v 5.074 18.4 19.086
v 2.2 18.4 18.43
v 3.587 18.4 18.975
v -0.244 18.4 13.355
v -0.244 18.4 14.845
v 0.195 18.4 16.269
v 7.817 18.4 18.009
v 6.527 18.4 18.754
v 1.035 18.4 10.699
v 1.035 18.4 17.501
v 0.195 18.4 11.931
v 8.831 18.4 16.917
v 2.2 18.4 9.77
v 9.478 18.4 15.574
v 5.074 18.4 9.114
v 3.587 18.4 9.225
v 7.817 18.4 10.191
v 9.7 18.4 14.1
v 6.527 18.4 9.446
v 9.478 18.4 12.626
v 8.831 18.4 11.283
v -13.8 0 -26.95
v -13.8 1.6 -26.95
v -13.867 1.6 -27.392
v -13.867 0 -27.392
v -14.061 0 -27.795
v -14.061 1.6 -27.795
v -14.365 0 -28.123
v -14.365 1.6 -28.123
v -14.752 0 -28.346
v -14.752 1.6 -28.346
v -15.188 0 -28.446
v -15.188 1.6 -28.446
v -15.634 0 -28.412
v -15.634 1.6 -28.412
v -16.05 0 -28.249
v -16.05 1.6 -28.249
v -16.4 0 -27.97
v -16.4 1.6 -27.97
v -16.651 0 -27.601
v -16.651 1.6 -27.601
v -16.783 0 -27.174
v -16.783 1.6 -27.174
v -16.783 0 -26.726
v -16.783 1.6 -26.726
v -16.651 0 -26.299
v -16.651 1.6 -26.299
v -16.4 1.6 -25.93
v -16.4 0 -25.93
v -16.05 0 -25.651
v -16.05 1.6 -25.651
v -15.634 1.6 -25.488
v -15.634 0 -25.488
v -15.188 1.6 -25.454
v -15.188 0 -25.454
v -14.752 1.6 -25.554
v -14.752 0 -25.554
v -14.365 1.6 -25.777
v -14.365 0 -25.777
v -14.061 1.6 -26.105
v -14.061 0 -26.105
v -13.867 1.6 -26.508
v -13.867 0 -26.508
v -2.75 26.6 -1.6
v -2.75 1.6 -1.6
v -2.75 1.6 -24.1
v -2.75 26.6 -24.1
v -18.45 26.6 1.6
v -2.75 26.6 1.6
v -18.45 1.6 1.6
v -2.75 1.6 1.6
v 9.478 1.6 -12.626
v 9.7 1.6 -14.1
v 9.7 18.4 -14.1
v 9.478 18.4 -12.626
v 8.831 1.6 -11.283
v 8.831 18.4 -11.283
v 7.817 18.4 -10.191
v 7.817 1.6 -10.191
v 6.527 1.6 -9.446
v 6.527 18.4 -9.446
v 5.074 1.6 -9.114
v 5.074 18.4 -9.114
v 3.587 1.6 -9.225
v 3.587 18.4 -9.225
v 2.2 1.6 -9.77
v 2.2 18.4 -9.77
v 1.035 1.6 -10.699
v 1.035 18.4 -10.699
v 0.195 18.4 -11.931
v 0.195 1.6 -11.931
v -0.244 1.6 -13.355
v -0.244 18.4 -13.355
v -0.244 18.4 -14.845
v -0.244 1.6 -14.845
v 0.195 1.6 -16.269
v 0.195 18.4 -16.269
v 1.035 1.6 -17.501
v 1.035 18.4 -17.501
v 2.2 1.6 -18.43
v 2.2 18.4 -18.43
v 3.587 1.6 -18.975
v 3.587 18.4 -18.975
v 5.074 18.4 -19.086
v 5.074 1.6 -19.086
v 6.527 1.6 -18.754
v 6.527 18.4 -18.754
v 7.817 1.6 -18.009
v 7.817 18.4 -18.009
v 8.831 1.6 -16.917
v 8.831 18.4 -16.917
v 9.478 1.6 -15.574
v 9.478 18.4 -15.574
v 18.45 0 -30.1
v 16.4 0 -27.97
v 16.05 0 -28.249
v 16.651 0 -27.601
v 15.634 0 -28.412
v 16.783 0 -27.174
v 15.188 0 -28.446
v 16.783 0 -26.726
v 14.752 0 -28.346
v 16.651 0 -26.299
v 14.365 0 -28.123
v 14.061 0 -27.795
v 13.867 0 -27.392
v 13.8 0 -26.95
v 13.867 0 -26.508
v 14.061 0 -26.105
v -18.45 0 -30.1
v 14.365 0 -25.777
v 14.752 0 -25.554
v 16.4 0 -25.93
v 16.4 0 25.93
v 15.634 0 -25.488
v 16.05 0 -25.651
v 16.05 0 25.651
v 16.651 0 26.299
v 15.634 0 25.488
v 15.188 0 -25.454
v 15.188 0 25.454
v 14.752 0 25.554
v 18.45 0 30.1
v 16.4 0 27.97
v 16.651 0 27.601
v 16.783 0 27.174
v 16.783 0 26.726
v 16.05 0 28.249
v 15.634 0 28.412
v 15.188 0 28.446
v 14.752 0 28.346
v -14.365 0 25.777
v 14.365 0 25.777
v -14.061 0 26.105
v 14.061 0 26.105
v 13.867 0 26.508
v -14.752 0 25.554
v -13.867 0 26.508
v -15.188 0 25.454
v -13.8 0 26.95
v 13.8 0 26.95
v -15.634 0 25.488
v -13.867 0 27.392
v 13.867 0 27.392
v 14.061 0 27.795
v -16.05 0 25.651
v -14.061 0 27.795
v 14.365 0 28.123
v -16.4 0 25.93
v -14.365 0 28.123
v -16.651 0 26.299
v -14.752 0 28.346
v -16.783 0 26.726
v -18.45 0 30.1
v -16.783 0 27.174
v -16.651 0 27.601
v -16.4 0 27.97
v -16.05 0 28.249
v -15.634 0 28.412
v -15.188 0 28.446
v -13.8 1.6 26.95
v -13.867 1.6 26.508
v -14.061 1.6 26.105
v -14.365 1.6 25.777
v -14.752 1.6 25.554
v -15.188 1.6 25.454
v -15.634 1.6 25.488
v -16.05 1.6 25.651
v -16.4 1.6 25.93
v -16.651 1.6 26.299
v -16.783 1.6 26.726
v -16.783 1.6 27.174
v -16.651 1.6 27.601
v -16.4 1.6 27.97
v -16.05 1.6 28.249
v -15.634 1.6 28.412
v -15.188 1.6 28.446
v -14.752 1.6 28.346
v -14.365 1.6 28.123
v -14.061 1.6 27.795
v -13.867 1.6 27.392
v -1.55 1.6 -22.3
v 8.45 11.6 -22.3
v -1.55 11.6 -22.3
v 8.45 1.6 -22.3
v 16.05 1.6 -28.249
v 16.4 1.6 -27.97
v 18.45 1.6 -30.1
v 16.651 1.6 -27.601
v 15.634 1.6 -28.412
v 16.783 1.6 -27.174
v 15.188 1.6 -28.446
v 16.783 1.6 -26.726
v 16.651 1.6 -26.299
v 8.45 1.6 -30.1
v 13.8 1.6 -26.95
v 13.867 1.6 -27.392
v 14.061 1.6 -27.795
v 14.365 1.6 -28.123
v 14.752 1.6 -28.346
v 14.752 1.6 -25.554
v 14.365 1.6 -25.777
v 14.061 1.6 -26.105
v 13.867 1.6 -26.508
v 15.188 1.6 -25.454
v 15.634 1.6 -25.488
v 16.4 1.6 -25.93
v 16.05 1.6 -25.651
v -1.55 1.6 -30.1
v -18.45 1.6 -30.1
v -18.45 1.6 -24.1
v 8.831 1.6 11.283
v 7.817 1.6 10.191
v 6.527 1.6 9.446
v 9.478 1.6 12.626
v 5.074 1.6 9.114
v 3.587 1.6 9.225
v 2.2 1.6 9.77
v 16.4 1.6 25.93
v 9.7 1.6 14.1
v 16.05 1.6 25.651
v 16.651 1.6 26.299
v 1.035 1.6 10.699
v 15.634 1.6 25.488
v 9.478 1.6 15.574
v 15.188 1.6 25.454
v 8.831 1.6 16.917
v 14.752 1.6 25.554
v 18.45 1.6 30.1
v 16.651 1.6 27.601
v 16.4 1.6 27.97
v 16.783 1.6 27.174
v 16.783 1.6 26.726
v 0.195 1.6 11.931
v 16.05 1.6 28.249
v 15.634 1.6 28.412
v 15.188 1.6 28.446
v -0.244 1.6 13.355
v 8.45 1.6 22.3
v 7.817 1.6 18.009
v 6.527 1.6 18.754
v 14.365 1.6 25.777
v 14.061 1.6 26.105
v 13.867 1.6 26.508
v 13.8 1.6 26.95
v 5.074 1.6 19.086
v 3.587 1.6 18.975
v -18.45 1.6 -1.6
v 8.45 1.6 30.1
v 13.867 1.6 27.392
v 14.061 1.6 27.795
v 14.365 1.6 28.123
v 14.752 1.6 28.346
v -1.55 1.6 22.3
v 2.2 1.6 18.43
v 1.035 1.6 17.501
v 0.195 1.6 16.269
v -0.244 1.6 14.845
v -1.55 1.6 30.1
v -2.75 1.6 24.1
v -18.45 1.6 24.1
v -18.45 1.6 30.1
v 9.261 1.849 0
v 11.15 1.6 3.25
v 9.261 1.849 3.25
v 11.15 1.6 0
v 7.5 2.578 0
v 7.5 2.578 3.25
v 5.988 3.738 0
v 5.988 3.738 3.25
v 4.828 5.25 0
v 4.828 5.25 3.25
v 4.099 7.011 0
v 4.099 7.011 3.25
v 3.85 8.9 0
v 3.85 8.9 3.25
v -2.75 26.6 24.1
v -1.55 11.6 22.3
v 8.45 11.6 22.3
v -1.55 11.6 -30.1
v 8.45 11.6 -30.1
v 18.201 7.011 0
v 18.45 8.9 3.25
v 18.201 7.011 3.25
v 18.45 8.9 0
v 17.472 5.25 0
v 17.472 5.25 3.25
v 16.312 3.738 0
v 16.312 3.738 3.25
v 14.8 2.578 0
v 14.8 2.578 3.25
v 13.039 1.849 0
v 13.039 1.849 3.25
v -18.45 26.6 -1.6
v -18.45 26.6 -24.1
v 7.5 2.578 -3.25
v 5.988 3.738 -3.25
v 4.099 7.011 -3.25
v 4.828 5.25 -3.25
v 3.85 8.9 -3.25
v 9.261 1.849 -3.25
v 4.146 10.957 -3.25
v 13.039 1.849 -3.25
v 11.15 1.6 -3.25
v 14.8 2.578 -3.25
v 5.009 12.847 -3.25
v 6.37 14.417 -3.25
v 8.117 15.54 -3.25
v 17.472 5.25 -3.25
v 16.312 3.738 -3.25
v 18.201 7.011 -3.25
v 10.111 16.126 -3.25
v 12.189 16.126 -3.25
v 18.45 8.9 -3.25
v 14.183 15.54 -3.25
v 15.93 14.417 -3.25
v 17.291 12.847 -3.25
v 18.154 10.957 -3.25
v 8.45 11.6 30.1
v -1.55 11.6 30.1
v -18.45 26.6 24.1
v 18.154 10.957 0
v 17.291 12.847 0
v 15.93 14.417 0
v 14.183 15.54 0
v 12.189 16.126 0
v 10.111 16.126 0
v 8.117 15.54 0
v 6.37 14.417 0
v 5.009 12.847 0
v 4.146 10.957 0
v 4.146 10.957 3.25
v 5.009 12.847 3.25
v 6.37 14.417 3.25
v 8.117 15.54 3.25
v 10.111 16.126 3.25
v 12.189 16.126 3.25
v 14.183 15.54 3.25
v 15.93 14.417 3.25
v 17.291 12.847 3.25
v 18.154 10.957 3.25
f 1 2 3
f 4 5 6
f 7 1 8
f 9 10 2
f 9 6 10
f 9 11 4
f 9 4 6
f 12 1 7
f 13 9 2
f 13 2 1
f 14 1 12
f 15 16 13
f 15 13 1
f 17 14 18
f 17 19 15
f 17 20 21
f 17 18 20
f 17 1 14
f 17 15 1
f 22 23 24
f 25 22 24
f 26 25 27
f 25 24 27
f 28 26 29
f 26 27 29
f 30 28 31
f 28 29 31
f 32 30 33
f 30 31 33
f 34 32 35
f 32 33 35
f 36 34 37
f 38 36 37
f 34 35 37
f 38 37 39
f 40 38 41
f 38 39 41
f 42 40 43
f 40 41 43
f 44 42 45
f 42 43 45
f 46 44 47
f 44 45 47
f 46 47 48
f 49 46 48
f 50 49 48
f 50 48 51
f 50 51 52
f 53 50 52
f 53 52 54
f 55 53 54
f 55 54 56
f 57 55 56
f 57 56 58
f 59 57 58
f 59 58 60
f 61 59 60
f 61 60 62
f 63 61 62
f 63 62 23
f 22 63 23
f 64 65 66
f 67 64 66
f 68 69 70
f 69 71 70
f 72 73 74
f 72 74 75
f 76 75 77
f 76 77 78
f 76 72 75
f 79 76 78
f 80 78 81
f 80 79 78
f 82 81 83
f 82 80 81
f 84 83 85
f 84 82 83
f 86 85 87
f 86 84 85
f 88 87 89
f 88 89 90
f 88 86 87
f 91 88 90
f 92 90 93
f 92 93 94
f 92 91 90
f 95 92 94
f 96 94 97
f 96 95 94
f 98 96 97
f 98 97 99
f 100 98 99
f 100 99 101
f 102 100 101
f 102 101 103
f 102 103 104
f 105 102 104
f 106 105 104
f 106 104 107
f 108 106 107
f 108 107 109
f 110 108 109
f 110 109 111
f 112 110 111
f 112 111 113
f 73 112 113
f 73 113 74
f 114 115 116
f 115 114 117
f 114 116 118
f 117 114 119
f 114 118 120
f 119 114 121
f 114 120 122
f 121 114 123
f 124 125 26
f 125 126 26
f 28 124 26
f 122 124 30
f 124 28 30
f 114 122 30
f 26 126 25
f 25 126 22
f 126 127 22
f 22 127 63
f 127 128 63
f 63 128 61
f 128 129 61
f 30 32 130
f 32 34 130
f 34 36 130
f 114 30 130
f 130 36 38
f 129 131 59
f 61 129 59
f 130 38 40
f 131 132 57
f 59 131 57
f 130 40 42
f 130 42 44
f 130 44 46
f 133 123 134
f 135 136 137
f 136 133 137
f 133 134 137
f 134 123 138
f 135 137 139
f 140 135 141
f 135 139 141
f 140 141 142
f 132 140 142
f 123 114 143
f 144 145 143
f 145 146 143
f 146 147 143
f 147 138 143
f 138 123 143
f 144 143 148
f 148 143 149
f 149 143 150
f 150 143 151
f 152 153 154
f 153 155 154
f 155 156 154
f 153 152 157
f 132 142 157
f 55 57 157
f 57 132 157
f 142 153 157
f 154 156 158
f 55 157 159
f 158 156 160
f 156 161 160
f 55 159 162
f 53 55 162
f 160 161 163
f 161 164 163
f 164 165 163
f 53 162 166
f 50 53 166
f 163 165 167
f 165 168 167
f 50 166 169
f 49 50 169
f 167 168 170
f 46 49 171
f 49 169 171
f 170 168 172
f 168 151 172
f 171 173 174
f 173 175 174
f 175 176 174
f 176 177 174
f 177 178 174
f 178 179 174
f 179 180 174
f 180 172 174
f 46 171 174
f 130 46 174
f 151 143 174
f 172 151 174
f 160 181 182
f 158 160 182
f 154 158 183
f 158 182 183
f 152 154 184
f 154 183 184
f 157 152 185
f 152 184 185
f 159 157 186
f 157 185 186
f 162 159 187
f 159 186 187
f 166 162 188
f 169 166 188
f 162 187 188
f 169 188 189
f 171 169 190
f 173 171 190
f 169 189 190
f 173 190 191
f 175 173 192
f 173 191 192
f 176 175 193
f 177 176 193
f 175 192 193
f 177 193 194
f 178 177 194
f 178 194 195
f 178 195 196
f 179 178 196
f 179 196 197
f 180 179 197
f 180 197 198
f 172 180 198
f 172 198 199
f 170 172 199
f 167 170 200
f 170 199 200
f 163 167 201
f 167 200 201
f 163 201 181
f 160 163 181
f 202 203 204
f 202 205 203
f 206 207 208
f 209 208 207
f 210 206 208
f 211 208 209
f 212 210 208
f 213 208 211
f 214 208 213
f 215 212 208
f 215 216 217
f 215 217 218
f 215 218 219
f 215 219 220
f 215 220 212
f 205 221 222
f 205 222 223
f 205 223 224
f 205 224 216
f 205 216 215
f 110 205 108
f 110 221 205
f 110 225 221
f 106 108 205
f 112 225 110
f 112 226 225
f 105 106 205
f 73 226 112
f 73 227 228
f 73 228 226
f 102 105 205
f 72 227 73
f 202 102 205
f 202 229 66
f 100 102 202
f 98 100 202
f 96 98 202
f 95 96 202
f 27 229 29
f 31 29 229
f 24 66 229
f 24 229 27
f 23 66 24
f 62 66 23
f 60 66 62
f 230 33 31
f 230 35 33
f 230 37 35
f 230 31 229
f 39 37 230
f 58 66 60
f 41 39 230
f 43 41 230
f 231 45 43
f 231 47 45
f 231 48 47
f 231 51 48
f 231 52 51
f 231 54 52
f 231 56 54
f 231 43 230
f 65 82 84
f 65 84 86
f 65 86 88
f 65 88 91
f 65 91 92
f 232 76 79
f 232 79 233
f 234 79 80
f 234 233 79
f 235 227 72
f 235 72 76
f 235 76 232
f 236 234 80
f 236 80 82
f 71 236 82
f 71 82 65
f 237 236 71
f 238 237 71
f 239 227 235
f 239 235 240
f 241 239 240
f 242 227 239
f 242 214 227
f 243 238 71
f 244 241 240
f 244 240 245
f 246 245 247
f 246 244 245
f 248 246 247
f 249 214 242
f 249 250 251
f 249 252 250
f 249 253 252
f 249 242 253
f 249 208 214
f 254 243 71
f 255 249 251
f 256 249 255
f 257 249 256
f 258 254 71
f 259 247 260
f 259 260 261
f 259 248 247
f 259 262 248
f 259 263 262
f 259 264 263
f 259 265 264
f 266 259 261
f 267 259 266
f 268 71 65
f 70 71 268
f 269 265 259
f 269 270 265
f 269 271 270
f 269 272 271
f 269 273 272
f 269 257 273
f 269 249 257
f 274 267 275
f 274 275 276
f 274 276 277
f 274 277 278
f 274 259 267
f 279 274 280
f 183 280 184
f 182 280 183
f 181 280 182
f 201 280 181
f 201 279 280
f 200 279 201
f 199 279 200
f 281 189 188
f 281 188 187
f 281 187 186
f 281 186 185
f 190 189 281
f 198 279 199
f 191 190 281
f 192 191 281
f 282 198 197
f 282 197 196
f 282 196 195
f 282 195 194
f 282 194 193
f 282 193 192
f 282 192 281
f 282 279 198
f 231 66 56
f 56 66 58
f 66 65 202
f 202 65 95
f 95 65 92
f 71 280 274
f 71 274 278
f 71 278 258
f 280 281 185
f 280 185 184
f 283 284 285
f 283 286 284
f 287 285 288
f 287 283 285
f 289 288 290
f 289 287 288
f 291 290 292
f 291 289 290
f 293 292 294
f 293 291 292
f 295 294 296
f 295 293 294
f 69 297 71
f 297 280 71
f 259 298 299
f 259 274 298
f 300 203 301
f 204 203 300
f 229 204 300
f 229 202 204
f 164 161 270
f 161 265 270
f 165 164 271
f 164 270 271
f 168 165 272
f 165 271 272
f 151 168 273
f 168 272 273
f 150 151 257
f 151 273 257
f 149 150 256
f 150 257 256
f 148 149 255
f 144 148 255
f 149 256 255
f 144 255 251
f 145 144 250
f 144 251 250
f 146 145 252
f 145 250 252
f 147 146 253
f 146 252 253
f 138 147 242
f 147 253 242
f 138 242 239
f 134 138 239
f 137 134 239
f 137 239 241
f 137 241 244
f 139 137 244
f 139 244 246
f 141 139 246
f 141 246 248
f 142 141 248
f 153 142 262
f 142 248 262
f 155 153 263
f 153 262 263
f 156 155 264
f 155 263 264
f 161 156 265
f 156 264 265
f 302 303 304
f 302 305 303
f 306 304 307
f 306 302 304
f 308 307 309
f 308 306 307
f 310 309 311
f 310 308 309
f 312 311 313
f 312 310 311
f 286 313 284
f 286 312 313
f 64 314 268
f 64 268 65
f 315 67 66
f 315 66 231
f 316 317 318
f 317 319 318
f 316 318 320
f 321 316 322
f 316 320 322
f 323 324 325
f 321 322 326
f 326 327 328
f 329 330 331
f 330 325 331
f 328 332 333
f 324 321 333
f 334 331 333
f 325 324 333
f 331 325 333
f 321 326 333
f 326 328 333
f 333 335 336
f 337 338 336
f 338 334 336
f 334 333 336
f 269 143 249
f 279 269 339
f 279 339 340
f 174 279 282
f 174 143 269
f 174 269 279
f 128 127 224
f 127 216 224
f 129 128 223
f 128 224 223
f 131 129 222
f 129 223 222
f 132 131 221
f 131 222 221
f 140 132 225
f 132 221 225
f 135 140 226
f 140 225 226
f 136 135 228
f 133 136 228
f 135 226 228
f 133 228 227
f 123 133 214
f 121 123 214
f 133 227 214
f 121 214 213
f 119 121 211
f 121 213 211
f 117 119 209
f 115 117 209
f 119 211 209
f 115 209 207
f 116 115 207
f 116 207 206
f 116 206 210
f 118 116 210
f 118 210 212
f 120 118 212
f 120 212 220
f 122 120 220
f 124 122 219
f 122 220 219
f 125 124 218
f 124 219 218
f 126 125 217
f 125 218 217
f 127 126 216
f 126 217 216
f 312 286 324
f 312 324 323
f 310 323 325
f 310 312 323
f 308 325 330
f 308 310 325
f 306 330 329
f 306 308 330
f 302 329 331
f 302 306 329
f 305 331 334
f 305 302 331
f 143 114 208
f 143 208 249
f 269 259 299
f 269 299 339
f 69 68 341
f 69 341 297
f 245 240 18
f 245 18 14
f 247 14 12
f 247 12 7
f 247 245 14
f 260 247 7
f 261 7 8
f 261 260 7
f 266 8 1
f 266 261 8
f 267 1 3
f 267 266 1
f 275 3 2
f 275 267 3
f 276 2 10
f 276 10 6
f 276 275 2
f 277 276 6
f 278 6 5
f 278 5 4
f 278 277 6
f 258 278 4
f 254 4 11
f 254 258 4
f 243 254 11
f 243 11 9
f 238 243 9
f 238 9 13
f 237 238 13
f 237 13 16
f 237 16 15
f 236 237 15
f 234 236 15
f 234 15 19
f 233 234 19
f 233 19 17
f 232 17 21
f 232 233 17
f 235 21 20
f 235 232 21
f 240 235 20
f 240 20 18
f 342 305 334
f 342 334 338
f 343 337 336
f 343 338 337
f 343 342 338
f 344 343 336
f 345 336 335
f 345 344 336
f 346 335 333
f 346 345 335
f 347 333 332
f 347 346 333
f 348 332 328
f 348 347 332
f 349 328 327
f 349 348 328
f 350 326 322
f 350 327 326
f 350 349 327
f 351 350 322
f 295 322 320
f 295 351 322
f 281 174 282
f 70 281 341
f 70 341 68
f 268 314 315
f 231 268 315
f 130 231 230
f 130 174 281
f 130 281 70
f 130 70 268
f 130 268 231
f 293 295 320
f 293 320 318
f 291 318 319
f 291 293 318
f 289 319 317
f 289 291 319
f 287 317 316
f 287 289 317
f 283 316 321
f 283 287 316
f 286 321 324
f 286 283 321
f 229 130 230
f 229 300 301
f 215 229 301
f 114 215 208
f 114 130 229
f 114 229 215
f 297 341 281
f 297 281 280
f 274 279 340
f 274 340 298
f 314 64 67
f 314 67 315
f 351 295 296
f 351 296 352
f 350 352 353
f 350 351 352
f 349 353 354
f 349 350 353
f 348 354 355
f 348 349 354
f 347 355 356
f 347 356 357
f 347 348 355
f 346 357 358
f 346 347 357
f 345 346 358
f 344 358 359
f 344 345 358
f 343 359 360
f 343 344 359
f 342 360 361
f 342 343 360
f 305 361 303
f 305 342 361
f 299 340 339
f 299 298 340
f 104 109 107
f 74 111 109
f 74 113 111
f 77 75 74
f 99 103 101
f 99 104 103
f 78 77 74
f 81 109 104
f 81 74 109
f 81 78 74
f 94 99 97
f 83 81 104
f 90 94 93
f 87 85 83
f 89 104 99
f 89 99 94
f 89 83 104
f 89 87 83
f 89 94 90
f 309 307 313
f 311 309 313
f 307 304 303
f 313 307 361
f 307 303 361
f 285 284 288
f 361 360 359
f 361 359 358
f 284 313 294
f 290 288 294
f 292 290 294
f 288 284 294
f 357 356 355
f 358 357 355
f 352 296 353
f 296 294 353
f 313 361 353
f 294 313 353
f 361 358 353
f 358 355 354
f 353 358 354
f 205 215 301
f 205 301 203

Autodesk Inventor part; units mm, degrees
ref_plane "YZ Plane" through (0, 0, 0) normal (1, 0, 0) x (0, 1, 0)
sketch "Sketch1" plane through (0, 0, 0) normal (0, 1, 0) x (-1, 0, 0)
  line L0 (-18.45, 30.1) -> (18.45, 30.1)
  line L1 (18.45, 30.1) -> (18.45, -30.1)
  line L2 (18.45, -30.1) -> (-18.45, -30.1)
  line L3 (-18.45, -30.1) -> (-18.45, 30.1)
  line L4 (-18.45, 30.1) -> (18.45, -30.1) construction
  line L5 (18.45, 30.1) -> (-18.45, -30.1) construction
  point P0 (0, 0)
  dimension "d0" = 36.9
  dimension "d1" = 60.2
extrude "Extrusion1" add sketch "Sketch1" along normal blind 1.6
sketch "Sketch2" plane through (0, 1.6, 0) normal (0, 1, 0) x (1, 0, 0)
  line L0 (-18.45, -30.1) -> (18.45, -30.1) projected
  line L1 (18.45, -30.1) -> (8.45, -30.1)
  line L2 (8.45, -30.1) -> (-1.55, -30.1)
  line L3 (-1.55, -30.1) -> (-1.55, -22.3)
  line L4 (-1.55, -22.3) -> (8.45, -22.3)
  line L5 (8.45, -22.3) -> (8.45, -30.1)
  point P0 (0, 0)
  dimension "d4" = 10
  dimension "d5" = 10
  dimension "d6" = 7.8
extrude "Extrusion2" add sketch "Sketch2" along normal blind 10
sketch "Sketch3" plane through (0, 1.6, 0) normal (0, 1, 0) x (1, 0, 0)
  line L0 (-18.45, -30.1) -> (18.45, -30.1) projected
  line L1 (18.45, -30.1) -> (4.7, -30.1)
  line L2 (4.7, -30.1) -> (4.7, -14.1)
  circle A0 centre (4.7, -14.1) radius 5
  point P0 (0, 0)
  dimension "d9" = 13.75
  dimension "d10" = 16
  dimension "d11" = 10
extrude "Extrusion3" add sketch "Sketch3" along normal blind 16.8
sketch "Sketch4" plane through (0, 1.6, 0) normal (0, 1, 0) x (1, 0, 0)
  line L0 (-18.45, -30.1) -> (-1.55, -30.1) projected
  line L1 (-18.45, -30.1) -> (-18.45, -24.1)
  line L2 (-18.45, 30.1) -> (-18.45, -30.1) projected
  line L3 (-18.45, -24.1) -> (-2.75, -24.1)
  line L4 (-2.75, -24.1) -> (-2.75, -1.6)
  line L5 (-2.75, -1.6) -> (-18.45, -1.6)
  line L6 (-18.45, -1.6) -> (-18.45, -24.1)
  point P0 (0, 0)
  dimension "d14" = 6
  dimension "d15" = 15.7
  dimension "d16" = 22.5
extrude "Extrusion4" add sketch "Sketch4" along normal blind 25
ref_plane "Work Plane1" through (18.45, 0, 0) normal (0, 0, -1) x (-1, 0, 0)
sketch "Sketch6" plane through (18.45, 0, 0) normal (0, 0, -1) x (-1, 0, 0)
  line L0 (0, 1.6) -> (0, 8.9)
  line L1 (0, 8.9) -> (7.3, 8.9)
  circle A0 centre (7.3, 8.9) radius 7.3
  point P0 (18.45, 0)
  dimension "d25" = 7.3
  dimension "d26" = 7.3
  dimension "d27" = 14.6
extrude "Extrusion6" add sketch "Sketch6" against normal blind 3.25
mirror "Mirror2" about plane through (18.45, 0, 0) normal (0, 0, -1) of "Extrusion4", "Extrusion2", "Extrusion3", "Extrusion6"
sketch "Sketch7" plane through (0, 1.6, 0) normal (0, 1, 0) x (1, 0, 0)
  circle A0 centre (-15.3, 26.95) radius 1.5
  point P0 (0, 0)
  point P1 (-18.45, 30.1)
  dimension "d32" = 3
extrude "Extrusion7" cut sketch "Sketch7" against normal blind 3.25
ref_plane "Work Plane2" through (0, 0, 30.1) normal (1, 0, 0) x (0, 0, -1)
mirror "Mirror3" about plane through (0, 0, 30.1) normal (1, 0, 0) of "Extrusion7"
mirror "Mirror4" about plane through (18.45, 0, 0) normal (0, 0, -1) of "Extrusion7", "Mirror3"
properties part number "ConversosDCDC"
